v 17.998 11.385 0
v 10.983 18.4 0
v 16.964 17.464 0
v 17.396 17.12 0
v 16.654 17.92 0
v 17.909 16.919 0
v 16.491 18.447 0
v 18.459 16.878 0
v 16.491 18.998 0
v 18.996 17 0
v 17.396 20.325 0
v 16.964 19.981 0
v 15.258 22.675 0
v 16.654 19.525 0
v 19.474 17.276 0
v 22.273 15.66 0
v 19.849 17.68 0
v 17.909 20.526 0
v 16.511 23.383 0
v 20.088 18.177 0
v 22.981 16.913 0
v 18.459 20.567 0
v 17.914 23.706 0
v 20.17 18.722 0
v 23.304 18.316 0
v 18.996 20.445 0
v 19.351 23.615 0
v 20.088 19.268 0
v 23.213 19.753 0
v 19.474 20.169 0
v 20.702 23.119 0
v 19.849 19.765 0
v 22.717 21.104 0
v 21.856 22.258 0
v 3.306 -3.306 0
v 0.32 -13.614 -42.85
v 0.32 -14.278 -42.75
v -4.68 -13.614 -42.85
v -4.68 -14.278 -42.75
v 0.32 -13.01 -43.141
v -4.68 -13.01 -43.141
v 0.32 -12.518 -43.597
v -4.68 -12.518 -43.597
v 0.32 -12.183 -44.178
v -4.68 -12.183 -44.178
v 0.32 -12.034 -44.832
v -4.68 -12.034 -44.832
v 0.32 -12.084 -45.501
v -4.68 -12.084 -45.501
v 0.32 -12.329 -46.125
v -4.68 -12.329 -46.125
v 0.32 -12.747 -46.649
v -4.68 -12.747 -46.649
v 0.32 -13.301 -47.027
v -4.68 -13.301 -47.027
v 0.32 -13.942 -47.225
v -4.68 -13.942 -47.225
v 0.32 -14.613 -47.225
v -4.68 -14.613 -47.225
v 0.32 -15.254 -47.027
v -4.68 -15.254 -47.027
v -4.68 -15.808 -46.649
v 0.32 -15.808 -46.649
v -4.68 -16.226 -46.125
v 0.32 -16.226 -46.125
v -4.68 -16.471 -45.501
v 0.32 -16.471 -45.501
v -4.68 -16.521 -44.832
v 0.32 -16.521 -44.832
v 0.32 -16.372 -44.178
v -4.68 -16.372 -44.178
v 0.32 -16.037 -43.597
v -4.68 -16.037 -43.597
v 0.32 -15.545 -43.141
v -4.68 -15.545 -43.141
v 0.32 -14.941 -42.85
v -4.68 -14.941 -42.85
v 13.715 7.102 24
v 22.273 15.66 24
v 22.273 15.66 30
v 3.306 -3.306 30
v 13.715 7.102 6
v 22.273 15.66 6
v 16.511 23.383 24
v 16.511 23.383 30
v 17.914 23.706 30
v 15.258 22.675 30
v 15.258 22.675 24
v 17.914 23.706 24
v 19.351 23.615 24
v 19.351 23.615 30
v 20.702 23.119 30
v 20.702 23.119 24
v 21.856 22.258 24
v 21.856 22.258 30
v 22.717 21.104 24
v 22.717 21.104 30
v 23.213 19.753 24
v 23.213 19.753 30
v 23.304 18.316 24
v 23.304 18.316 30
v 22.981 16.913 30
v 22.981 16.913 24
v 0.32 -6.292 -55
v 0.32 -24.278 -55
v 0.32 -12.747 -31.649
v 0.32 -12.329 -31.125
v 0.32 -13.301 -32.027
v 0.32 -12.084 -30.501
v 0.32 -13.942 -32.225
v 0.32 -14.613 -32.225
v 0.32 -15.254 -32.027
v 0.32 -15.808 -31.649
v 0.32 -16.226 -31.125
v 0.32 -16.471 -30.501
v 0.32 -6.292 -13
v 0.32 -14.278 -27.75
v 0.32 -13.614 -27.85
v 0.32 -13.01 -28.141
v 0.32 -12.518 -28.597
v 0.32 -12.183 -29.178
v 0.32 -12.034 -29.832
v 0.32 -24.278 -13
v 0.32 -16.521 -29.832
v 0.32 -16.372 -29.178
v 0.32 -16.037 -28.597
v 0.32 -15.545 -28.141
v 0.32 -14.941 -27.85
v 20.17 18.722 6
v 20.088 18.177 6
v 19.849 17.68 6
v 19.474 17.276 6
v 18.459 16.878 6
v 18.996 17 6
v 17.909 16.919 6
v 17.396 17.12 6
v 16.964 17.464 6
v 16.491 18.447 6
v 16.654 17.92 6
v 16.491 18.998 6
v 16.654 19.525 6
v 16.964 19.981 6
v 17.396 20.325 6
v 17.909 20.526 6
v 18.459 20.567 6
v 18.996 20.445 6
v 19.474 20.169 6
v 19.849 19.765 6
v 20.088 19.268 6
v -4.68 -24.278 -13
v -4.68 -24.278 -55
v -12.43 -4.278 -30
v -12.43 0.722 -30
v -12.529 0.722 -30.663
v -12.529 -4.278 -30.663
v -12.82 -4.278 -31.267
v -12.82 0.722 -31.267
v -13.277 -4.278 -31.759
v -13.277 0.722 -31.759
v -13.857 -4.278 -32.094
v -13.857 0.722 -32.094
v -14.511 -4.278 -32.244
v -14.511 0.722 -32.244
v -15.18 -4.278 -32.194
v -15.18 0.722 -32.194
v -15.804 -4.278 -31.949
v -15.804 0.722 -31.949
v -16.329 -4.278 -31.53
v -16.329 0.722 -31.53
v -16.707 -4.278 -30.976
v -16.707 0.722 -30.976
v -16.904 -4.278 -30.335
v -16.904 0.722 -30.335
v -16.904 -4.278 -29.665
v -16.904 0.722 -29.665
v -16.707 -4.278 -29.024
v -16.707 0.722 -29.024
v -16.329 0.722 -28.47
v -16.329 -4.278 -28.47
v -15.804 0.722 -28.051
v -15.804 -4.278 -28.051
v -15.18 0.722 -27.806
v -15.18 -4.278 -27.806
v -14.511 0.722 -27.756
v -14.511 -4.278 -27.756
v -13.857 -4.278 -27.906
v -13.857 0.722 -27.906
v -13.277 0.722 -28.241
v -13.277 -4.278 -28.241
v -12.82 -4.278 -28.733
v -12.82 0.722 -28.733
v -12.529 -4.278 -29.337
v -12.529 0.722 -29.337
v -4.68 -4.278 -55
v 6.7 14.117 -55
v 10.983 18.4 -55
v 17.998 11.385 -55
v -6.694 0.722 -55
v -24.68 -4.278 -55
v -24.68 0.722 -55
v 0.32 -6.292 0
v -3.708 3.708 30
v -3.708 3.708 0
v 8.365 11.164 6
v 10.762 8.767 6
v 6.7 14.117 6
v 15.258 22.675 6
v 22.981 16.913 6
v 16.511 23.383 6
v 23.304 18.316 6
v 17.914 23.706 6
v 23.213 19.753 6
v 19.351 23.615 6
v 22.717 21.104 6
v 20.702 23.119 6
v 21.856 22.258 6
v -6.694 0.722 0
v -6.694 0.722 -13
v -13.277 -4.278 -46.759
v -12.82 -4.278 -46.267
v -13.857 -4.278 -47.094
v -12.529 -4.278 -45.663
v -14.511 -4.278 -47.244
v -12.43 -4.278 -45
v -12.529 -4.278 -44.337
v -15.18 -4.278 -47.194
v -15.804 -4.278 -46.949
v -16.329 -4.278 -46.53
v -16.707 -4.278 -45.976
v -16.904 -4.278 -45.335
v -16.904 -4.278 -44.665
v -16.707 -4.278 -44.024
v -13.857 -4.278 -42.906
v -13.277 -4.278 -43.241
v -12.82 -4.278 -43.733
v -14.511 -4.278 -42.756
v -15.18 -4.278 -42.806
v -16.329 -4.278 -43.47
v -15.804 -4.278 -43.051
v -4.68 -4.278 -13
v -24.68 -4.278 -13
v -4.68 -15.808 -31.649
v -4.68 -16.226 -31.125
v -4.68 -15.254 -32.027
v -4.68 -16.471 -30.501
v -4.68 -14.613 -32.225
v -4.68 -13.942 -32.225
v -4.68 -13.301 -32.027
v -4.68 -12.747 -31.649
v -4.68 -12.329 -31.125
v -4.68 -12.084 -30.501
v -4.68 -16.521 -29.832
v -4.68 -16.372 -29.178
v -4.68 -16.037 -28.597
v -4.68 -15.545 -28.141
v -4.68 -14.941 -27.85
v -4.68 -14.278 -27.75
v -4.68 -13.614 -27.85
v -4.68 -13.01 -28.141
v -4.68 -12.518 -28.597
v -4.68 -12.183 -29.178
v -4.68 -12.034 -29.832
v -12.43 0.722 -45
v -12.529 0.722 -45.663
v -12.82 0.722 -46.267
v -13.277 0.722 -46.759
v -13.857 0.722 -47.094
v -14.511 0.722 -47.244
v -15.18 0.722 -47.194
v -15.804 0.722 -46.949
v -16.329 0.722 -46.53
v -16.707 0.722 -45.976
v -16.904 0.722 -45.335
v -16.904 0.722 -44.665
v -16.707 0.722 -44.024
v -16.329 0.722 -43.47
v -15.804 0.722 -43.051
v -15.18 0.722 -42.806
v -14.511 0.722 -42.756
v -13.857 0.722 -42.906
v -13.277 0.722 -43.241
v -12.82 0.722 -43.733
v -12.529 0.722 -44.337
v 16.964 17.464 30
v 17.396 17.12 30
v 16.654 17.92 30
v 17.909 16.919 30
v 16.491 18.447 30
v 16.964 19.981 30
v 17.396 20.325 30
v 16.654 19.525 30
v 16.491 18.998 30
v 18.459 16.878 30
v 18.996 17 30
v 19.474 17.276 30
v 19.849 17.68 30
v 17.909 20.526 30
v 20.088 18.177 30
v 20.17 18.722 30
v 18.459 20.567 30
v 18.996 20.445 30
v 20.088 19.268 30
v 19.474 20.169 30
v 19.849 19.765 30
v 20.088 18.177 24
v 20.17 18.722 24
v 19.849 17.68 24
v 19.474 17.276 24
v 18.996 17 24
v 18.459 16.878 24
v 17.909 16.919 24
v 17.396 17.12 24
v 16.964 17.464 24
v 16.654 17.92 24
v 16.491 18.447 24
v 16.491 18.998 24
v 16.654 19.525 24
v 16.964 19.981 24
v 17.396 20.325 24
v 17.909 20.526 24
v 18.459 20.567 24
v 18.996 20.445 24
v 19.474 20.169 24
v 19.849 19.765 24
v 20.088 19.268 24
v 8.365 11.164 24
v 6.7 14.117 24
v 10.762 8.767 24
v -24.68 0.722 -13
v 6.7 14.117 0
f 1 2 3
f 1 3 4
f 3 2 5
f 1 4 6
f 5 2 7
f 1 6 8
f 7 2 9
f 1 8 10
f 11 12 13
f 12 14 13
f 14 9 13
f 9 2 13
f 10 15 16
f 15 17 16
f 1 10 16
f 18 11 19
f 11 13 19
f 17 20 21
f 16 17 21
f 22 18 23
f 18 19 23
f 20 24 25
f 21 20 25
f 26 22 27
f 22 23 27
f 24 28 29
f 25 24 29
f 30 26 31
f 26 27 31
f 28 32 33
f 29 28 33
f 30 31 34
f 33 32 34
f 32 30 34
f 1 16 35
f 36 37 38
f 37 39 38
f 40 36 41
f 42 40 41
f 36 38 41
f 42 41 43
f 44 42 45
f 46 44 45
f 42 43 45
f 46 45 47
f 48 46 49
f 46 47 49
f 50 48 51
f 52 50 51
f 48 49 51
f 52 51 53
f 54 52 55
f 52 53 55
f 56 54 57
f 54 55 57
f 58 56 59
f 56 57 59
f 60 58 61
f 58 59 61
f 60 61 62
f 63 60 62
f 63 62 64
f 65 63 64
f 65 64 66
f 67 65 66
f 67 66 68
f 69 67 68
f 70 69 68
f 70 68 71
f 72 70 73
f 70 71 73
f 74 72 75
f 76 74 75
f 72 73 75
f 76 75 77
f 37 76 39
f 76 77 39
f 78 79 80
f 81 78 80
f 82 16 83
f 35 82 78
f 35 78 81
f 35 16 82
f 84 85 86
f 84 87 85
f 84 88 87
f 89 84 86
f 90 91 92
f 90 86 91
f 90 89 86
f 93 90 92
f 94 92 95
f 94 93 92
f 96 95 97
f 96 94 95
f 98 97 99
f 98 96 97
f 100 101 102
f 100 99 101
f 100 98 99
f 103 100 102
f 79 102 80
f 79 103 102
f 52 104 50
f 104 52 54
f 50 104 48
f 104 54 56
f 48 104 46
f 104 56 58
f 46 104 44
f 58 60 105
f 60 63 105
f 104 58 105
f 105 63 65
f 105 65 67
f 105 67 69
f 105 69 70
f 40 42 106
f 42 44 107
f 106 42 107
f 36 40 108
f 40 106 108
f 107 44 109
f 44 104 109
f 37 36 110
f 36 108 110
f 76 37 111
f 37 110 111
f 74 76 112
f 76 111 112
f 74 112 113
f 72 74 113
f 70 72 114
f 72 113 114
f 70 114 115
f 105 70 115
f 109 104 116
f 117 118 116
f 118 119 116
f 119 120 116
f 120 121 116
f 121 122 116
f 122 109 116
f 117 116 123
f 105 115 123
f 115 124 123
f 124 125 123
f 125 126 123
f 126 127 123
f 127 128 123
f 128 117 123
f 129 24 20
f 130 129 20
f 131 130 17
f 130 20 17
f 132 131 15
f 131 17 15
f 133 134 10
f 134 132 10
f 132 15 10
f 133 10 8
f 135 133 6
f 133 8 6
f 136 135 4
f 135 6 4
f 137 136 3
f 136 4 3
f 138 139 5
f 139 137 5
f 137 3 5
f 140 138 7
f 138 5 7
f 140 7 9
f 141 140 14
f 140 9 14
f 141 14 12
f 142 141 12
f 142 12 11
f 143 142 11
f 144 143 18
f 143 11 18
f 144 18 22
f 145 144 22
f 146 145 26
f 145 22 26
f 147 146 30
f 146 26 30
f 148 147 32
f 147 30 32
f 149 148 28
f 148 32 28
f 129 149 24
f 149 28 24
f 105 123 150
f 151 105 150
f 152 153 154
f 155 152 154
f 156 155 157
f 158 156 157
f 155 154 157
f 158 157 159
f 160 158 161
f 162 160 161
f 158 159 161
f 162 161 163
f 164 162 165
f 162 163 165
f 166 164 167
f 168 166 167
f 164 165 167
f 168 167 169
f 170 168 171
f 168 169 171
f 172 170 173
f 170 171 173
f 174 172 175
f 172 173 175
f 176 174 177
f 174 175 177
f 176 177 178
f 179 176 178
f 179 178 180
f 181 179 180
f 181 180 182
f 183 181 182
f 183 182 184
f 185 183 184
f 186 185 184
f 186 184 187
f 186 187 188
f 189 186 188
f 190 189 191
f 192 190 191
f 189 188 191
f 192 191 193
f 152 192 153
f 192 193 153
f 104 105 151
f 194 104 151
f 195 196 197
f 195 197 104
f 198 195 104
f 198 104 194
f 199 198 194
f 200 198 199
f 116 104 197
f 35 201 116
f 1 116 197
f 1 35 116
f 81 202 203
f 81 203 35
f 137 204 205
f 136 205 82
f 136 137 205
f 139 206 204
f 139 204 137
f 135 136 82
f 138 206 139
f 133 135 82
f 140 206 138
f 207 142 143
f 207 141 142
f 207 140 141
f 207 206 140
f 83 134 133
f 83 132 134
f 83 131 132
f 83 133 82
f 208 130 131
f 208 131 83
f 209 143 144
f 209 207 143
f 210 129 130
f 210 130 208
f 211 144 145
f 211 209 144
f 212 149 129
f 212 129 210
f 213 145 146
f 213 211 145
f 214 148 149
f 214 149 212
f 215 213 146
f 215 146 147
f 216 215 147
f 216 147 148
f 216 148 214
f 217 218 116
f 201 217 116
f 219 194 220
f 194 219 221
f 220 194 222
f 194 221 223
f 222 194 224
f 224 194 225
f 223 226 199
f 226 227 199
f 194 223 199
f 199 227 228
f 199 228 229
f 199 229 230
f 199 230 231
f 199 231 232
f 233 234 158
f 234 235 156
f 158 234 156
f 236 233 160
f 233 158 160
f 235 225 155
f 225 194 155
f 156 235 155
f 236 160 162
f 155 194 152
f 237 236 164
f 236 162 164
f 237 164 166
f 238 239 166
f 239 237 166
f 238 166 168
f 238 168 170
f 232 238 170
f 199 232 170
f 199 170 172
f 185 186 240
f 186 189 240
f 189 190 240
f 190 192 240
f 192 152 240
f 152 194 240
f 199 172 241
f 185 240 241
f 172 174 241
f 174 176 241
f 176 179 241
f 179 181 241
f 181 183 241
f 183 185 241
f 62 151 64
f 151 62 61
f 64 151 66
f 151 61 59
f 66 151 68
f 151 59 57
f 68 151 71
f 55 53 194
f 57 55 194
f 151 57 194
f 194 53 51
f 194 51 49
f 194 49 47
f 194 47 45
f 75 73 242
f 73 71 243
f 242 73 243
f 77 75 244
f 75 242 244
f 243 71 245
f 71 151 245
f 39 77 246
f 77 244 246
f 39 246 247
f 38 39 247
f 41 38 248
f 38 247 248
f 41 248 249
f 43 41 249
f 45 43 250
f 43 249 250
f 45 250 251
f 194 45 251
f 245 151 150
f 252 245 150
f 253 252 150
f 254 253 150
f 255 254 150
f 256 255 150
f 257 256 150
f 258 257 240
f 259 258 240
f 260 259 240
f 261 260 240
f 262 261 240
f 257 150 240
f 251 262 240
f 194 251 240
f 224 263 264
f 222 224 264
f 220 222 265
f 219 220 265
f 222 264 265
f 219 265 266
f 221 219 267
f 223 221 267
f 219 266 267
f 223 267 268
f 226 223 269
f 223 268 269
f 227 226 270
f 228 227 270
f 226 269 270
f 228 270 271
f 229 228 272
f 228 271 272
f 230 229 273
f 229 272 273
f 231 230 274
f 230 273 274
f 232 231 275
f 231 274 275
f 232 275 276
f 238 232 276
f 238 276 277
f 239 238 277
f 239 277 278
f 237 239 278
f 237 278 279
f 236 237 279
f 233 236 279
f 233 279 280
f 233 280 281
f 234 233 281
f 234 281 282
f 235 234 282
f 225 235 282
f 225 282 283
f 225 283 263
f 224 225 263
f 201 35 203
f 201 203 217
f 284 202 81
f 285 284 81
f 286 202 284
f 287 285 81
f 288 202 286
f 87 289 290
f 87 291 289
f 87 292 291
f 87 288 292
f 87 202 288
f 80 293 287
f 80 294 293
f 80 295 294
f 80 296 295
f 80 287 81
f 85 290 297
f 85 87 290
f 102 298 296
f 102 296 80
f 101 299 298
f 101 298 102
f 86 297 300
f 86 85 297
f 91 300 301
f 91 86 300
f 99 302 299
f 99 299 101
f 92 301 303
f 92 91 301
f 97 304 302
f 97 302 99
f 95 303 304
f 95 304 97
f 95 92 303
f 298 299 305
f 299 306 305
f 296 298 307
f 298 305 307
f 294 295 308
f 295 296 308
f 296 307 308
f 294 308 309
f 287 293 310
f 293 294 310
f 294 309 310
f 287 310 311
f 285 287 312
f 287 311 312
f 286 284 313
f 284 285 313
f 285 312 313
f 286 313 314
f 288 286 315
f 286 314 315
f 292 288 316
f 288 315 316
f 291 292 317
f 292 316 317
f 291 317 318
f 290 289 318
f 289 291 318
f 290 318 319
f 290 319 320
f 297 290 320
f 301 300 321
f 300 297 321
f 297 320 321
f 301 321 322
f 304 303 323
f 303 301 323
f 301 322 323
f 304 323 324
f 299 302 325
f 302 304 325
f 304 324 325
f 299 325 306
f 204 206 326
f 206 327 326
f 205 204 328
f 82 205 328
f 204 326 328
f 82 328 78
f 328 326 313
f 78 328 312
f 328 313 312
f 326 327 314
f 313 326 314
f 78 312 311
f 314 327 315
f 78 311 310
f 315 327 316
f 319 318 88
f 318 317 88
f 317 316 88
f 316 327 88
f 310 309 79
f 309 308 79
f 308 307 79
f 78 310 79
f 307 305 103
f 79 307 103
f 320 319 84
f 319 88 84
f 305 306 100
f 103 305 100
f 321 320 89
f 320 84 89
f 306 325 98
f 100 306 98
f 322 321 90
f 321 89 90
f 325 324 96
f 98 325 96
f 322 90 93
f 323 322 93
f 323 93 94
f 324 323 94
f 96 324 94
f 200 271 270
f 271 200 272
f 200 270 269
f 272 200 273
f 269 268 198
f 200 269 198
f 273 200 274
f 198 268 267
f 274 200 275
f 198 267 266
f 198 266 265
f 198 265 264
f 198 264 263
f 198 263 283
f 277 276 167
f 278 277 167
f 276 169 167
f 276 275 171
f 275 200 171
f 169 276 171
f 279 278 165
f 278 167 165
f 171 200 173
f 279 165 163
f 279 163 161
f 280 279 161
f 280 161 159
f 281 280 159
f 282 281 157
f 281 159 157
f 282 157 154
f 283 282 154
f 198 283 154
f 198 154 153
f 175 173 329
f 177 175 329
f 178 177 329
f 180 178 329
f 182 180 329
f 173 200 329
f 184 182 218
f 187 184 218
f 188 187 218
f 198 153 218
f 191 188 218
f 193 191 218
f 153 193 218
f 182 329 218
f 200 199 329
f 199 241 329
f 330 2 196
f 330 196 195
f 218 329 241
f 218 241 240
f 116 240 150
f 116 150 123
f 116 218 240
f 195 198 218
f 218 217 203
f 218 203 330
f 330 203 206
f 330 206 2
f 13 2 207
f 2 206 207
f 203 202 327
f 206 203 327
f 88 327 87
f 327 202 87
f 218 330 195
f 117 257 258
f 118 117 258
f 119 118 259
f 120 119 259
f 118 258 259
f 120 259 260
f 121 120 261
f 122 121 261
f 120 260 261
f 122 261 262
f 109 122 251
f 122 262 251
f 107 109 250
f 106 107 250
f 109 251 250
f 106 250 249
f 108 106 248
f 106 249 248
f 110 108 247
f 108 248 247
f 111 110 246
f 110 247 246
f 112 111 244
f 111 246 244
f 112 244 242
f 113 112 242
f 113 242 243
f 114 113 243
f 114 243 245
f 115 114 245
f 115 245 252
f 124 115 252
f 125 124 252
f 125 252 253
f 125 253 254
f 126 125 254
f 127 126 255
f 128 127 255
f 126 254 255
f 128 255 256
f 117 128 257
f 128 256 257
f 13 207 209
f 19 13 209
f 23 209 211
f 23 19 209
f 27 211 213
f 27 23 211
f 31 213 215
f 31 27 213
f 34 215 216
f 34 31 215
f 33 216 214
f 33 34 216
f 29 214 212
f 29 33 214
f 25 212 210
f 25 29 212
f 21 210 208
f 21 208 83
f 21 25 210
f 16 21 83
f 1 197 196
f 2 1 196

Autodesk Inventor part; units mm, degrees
ref_plane "YZ Plane" through (0, 0, 0) normal (1, 0, 0) x (0, 1, 0)
ref_plane "XZ Plane" through (0, 0, 0) normal (0, 1, 0) x (-1, 0, 0)
ref_plane "XY Plane" through (0, 0, 0) normal (0, 0, 1) x (1, 0, 0)
sketch "Sketch1" plane through (0, 0, 0) normal (0, 0, 1) x (1, 0, 0)
  line L0 (-6.6945, 0.7224) -> (-24.6795, 0.7224)
  line L1 (-24.6795, 0.7224) -> (-24.6795, -4.2776)
  line L2 (-24.6795, -4.2776) -> (-4.6795, -4.2776)
  line L3 (-4.6795, -4.2776) -> (-4.6795, -24.2776)
  line L4 (-4.6795, -24.2776) -> (0.3205, -24.2776)
  line L5 (0.3205, -24.2776) -> (0.3205, -6.2925)
  line L6 (-6.6945, 0.7224) -> (15.2577, 22.6746)
  line L7 (22.2726, 15.6597) -> (0.3205, -6.2925)
  circle A0 centre (18.3205, 18.7224) radius 1.85
  arc A1 (22.2726, 15.6597) -> (15.2577, 22.6746) centre (18.3205, 18.7224) ccw
  dimension "d0" = 20
  dimension "d1" = 20
  dimension "d2" = 5
  dimension "d3" = 5
  dimension "d7" = 23
  dimension "d8" = 23
  dimension "d9" = 3.7
  dimension "d18" = 5
  dimension "d19" = 135
extrude "Extrusion1" add sketch "Sketch1" along normal blind 30
ref_plane "Work Plane1" through (0, 0, 24) normal (0, 0, 1) x (1, 0, 0)
sketch "Sketch3" plane through (0, 0, 24) normal (0, 0, 1) x (1, 0, 0)
  circle A0 centre (18.3205, 18.7224) radius 1.85 projected
  circle A1 centre (18.3205, 18.7224) radius 12.5
  point P0 (0, 0)
  dimension "d13" = 25
extrude "Extrusion3" cut sketch "Sketch3" against normal blind 18
sketch "Sketch5" plane through (0, 0, 0) normal (0, 0, -1) x (-1, 0, 0)
  circle A0 centre (-18.3205, 18.7224) radius 1.85 projected
  line L0 (24.6795, -4.2776) -> (24.6795, 0.7224) projected
  line L1 (24.6795, 0.7224) -> (6.6945, 0.7224) projected
  line L2 (6.6945, 0.7224) -> (-15.2577, 22.6746) projected
  arc A1 (-15.2577, 22.6746) -> (-22.2726, 15.6597) centre (-18.3205, 18.7224) ccw projected
  line L3 (-22.2726, 15.6597) -> (-0.3205, -6.2925) projected
  line L4 (-0.3205, -6.2925) -> (-0.3205, -24.2776) projected
  line L5 (-0.3205, -24.2776) -> (4.6795, -24.2776) projected
  line L6 (4.6795, -24.2776) -> (4.6795, -4.2776) projected
  line L7 (4.6795, -4.2776) -> (24.6795, -4.2776) projected
  line L8 (-0.3205, -6.2925) -> (6.6945, 0.7224)
  point P0 (0, 0)
extrude "Extrusion5" add sketch "Sketch5" along normal blind 55 contours L7 L6 L5 L4 L8 L1 L0
sketch "Sketch8" plane through (-4.6795, -24.2776, -55) normal (-1, 0, 0) x (0, 0, 1)
  circle A0 centre (10, 10) radius 2.25
  line L0 (85, 0) -> (0, 0) projected
  line L1 (0, 0) -> (0, 20) projected
  circle A1 centre (25, 10) radius 2.25
  point P0 (55, 24.2776)
  dimension "d40" = 4.5
  dimension "d41" = 10
  dimension "d42" = 10
  dimension "d43" = 4.5
  dimension "d44" = 10
  dimension "d45" = 15
sketch "Sketch9" plane through (-24.6795, 0.7224, 30) normal (0, 1, 0) x (1, 0, 0)
  circle A0 centre (10, 75) radius 2.25
  circle A1 centre (10, 60) radius 2.25
  line L0 (0, 85) -> (17.9851, 85) projected
  line L1 (0, 0) -> (0, 85) projected
  point P0 (24.6795, 30)
  dimension "d46" = 10
  dimension "d47" = 10
  dimension "d48" = 10
  dimension "d49" = 15
  dimension "d50" = 4.5
  dimension "d51" = 4.5
extrude "Extrusion8" cut sketch "Sketch9" against normal mid plane 20
extrude "Extrusion9" cut sketch "Sketch8" against normal blind 20
sketch "Sketch10" plane through (0, 0, 30) normal (0, 0, 1) x (1, 0, 0)
  line L0 (-3.9108, 3.9108) -> (4.5333, -4.5333)
  line L1 (4.5333, -4.5333) -> (4.5333, -31.01)
  line L2 (4.5333, -31.01) -> (-28.169, -31.01)
  line L3 (-28.169, -31.01) -> (-28.169, 3.9108)
  line L4 (-28.169, 3.9108) -> (-3.9108, 3.9108)
  point P0 (0, 0)
  dimension "d56" = 135
  dimension "d57" = 0
extrude "Extrusion10" cut sketch "Sketch10" against normal blind 43
sketch "Sketch11" plane through (0, 0, 0) normal (0, 0, -1) x (-1, 0, 0)
  line L0 (6.6945, 0.7224) -> (-0.3205, -6.2925) projected
  line L1 (-0.3205, -6.2925) -> (-17.9981, 11.3852)
  line L2 (-17.9981, 11.3852) -> (-10.9832, 18.4001)
  line L3 (-15.2577, 22.6746) -> (-6.6999, 14.1167) projected
  line L4 (6.6945, 0.7224) -> (-10.9832, 18.4001)
  line L5 (6.6945, 0.7224) -> (-0.3205, -6.2925)
  point P0 (0, 0)
  dimension "d60" = 25
extrude "Extrusion11" add sketch "Sketch11" along normal blind 55
equation "\"d8\" = d7"
equation "\"d43\" = d40"
equation "\"d44\" = d41"
equation "\"RodDiameter\" = 8"
equation "\"VerticalBearingOD\" = 16"
equation "\"PrintingClearance\" = 0.2"
equation "\"TubeID\" = 18"
properties part number "PulleyHolderXY"
